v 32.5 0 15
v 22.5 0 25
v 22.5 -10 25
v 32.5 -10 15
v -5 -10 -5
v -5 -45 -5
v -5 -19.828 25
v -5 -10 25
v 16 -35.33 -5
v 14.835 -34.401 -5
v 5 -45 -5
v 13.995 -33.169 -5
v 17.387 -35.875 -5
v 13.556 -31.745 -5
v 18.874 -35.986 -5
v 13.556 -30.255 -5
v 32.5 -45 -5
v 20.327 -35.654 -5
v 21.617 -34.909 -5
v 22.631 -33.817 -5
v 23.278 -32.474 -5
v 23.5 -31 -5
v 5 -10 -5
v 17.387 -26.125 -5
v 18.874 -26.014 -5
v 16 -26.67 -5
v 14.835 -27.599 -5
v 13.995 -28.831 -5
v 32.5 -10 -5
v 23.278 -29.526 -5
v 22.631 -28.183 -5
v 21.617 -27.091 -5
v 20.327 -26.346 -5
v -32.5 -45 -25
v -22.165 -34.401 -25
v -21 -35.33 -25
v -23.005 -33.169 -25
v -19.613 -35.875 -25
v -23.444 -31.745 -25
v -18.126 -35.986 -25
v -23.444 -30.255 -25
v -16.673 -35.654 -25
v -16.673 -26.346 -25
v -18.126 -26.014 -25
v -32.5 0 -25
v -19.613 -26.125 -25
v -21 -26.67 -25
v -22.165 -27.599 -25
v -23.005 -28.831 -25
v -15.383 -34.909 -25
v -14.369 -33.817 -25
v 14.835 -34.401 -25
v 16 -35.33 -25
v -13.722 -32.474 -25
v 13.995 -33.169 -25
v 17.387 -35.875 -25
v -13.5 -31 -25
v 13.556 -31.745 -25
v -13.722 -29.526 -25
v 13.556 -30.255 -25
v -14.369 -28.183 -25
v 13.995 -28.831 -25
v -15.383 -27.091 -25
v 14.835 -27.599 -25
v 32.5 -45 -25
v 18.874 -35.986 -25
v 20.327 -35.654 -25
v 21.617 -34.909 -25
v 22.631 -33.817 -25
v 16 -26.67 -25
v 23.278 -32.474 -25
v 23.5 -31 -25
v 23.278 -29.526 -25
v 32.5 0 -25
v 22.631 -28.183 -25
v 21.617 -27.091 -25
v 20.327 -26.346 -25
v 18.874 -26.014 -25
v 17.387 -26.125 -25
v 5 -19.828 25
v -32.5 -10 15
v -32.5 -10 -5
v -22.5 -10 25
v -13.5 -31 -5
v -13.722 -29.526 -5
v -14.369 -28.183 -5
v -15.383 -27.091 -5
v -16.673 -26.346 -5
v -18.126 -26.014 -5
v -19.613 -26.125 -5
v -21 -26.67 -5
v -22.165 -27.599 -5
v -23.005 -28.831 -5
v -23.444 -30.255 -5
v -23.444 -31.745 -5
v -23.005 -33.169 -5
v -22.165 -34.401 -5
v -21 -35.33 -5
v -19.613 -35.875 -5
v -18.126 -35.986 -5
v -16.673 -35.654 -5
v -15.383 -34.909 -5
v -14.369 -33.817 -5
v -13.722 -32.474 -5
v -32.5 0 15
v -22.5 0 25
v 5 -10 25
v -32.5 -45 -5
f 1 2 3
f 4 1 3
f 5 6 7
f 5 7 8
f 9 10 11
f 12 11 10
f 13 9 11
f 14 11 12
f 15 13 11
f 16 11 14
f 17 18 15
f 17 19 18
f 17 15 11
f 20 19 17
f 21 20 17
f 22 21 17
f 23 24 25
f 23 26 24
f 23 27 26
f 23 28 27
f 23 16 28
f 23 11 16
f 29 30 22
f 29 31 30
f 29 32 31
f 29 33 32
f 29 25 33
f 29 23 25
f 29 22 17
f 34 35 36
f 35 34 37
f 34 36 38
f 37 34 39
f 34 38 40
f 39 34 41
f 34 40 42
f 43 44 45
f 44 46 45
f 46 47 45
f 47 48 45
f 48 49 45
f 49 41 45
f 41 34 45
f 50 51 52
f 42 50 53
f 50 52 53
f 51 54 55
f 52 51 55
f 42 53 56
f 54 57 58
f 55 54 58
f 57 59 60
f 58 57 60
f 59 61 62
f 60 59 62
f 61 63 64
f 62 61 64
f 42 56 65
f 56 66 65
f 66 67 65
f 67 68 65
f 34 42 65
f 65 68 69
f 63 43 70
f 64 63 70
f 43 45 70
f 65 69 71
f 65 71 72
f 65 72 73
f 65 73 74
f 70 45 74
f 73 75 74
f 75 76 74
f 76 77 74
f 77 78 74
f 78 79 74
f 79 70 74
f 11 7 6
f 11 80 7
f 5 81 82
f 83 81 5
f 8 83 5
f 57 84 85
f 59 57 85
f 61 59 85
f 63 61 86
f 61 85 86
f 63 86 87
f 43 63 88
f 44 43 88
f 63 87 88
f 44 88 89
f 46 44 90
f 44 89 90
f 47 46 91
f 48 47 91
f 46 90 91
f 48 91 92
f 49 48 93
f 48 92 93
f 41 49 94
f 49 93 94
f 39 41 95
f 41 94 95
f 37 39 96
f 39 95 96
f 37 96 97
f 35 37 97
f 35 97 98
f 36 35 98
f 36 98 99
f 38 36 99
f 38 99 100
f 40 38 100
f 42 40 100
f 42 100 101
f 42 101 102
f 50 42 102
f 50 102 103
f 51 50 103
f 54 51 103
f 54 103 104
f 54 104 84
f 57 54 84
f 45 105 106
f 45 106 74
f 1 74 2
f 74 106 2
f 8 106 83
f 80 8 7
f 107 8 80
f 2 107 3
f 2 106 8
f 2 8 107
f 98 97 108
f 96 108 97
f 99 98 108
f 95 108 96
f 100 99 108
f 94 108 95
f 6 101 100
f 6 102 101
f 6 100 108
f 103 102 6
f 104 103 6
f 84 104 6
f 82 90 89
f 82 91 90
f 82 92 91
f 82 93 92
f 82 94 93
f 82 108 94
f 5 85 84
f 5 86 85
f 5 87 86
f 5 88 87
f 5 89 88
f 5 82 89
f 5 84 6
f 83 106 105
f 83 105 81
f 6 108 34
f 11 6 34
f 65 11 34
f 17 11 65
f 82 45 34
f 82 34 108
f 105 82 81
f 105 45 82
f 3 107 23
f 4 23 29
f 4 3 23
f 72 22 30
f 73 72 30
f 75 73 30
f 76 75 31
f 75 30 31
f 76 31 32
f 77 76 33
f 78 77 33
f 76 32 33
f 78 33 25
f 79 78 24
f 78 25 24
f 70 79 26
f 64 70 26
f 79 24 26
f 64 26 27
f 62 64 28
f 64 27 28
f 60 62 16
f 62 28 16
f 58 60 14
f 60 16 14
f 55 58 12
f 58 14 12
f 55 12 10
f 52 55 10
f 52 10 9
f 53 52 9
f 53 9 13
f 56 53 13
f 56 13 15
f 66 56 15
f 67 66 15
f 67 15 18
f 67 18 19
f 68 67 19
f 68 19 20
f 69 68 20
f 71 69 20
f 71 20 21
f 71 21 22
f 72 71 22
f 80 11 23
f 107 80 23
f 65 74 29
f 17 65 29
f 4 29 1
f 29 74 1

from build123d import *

# Parameters (mm, degrees)
F0_W     = 65
F0_H     = 50
F1_DEPTH = 10
F2_W     = 65
F2_H     = 20
F3_DEPTH = 35
F5_DEPTH = 5
F6_SIZE  = 10
F7_R     = 5
F8_DEPTH = 20.001


with BuildPart() as f1:
    # F0 (on Front) → F1 (new body)
    with BuildSketch(Plane.XZ):
        Rectangle(F0_W, F0_H)
    extrude(amount=F1_DEPTH)

    # F2 (on face) → F3 (join)
    with BuildSketch(Plane.XZ.offset(10)):
        with Locations((0, -15)):
            Rectangle(F2_W, F2_H)
    extrude(amount=F3_DEPTH)

    # F4 (on Right) → F5 (join, symmetric)
    with BuildSketch(Plane.YZ):
        Polygon((-45, -5), (-10, -5), (-10, 25), (-19.8282375932, 25), align=None)
    extrude(amount=F5_DEPTH, both=True)

    # F6
    f6_edges = [f1.edges().sort_by_distance(p)[0] for p in [
        (-32.5, -5, 25),
        (32.5, -5, 25),
    ]]
    chamfer(f6_edges, length=F6_SIZE)

    # F7 (on face) → F8 (cut, through all)
    with BuildSketch(Plane.XY.offset(-5)):
        with Locations((-18.5, -31)):
            Circle(F7_R)
        with Locations((18.5, -31)):
            Circle(F7_R)
    extrude(amount=-F8_DEPTH, mode=Mode.SUBTRACT)


solid = f1.part
